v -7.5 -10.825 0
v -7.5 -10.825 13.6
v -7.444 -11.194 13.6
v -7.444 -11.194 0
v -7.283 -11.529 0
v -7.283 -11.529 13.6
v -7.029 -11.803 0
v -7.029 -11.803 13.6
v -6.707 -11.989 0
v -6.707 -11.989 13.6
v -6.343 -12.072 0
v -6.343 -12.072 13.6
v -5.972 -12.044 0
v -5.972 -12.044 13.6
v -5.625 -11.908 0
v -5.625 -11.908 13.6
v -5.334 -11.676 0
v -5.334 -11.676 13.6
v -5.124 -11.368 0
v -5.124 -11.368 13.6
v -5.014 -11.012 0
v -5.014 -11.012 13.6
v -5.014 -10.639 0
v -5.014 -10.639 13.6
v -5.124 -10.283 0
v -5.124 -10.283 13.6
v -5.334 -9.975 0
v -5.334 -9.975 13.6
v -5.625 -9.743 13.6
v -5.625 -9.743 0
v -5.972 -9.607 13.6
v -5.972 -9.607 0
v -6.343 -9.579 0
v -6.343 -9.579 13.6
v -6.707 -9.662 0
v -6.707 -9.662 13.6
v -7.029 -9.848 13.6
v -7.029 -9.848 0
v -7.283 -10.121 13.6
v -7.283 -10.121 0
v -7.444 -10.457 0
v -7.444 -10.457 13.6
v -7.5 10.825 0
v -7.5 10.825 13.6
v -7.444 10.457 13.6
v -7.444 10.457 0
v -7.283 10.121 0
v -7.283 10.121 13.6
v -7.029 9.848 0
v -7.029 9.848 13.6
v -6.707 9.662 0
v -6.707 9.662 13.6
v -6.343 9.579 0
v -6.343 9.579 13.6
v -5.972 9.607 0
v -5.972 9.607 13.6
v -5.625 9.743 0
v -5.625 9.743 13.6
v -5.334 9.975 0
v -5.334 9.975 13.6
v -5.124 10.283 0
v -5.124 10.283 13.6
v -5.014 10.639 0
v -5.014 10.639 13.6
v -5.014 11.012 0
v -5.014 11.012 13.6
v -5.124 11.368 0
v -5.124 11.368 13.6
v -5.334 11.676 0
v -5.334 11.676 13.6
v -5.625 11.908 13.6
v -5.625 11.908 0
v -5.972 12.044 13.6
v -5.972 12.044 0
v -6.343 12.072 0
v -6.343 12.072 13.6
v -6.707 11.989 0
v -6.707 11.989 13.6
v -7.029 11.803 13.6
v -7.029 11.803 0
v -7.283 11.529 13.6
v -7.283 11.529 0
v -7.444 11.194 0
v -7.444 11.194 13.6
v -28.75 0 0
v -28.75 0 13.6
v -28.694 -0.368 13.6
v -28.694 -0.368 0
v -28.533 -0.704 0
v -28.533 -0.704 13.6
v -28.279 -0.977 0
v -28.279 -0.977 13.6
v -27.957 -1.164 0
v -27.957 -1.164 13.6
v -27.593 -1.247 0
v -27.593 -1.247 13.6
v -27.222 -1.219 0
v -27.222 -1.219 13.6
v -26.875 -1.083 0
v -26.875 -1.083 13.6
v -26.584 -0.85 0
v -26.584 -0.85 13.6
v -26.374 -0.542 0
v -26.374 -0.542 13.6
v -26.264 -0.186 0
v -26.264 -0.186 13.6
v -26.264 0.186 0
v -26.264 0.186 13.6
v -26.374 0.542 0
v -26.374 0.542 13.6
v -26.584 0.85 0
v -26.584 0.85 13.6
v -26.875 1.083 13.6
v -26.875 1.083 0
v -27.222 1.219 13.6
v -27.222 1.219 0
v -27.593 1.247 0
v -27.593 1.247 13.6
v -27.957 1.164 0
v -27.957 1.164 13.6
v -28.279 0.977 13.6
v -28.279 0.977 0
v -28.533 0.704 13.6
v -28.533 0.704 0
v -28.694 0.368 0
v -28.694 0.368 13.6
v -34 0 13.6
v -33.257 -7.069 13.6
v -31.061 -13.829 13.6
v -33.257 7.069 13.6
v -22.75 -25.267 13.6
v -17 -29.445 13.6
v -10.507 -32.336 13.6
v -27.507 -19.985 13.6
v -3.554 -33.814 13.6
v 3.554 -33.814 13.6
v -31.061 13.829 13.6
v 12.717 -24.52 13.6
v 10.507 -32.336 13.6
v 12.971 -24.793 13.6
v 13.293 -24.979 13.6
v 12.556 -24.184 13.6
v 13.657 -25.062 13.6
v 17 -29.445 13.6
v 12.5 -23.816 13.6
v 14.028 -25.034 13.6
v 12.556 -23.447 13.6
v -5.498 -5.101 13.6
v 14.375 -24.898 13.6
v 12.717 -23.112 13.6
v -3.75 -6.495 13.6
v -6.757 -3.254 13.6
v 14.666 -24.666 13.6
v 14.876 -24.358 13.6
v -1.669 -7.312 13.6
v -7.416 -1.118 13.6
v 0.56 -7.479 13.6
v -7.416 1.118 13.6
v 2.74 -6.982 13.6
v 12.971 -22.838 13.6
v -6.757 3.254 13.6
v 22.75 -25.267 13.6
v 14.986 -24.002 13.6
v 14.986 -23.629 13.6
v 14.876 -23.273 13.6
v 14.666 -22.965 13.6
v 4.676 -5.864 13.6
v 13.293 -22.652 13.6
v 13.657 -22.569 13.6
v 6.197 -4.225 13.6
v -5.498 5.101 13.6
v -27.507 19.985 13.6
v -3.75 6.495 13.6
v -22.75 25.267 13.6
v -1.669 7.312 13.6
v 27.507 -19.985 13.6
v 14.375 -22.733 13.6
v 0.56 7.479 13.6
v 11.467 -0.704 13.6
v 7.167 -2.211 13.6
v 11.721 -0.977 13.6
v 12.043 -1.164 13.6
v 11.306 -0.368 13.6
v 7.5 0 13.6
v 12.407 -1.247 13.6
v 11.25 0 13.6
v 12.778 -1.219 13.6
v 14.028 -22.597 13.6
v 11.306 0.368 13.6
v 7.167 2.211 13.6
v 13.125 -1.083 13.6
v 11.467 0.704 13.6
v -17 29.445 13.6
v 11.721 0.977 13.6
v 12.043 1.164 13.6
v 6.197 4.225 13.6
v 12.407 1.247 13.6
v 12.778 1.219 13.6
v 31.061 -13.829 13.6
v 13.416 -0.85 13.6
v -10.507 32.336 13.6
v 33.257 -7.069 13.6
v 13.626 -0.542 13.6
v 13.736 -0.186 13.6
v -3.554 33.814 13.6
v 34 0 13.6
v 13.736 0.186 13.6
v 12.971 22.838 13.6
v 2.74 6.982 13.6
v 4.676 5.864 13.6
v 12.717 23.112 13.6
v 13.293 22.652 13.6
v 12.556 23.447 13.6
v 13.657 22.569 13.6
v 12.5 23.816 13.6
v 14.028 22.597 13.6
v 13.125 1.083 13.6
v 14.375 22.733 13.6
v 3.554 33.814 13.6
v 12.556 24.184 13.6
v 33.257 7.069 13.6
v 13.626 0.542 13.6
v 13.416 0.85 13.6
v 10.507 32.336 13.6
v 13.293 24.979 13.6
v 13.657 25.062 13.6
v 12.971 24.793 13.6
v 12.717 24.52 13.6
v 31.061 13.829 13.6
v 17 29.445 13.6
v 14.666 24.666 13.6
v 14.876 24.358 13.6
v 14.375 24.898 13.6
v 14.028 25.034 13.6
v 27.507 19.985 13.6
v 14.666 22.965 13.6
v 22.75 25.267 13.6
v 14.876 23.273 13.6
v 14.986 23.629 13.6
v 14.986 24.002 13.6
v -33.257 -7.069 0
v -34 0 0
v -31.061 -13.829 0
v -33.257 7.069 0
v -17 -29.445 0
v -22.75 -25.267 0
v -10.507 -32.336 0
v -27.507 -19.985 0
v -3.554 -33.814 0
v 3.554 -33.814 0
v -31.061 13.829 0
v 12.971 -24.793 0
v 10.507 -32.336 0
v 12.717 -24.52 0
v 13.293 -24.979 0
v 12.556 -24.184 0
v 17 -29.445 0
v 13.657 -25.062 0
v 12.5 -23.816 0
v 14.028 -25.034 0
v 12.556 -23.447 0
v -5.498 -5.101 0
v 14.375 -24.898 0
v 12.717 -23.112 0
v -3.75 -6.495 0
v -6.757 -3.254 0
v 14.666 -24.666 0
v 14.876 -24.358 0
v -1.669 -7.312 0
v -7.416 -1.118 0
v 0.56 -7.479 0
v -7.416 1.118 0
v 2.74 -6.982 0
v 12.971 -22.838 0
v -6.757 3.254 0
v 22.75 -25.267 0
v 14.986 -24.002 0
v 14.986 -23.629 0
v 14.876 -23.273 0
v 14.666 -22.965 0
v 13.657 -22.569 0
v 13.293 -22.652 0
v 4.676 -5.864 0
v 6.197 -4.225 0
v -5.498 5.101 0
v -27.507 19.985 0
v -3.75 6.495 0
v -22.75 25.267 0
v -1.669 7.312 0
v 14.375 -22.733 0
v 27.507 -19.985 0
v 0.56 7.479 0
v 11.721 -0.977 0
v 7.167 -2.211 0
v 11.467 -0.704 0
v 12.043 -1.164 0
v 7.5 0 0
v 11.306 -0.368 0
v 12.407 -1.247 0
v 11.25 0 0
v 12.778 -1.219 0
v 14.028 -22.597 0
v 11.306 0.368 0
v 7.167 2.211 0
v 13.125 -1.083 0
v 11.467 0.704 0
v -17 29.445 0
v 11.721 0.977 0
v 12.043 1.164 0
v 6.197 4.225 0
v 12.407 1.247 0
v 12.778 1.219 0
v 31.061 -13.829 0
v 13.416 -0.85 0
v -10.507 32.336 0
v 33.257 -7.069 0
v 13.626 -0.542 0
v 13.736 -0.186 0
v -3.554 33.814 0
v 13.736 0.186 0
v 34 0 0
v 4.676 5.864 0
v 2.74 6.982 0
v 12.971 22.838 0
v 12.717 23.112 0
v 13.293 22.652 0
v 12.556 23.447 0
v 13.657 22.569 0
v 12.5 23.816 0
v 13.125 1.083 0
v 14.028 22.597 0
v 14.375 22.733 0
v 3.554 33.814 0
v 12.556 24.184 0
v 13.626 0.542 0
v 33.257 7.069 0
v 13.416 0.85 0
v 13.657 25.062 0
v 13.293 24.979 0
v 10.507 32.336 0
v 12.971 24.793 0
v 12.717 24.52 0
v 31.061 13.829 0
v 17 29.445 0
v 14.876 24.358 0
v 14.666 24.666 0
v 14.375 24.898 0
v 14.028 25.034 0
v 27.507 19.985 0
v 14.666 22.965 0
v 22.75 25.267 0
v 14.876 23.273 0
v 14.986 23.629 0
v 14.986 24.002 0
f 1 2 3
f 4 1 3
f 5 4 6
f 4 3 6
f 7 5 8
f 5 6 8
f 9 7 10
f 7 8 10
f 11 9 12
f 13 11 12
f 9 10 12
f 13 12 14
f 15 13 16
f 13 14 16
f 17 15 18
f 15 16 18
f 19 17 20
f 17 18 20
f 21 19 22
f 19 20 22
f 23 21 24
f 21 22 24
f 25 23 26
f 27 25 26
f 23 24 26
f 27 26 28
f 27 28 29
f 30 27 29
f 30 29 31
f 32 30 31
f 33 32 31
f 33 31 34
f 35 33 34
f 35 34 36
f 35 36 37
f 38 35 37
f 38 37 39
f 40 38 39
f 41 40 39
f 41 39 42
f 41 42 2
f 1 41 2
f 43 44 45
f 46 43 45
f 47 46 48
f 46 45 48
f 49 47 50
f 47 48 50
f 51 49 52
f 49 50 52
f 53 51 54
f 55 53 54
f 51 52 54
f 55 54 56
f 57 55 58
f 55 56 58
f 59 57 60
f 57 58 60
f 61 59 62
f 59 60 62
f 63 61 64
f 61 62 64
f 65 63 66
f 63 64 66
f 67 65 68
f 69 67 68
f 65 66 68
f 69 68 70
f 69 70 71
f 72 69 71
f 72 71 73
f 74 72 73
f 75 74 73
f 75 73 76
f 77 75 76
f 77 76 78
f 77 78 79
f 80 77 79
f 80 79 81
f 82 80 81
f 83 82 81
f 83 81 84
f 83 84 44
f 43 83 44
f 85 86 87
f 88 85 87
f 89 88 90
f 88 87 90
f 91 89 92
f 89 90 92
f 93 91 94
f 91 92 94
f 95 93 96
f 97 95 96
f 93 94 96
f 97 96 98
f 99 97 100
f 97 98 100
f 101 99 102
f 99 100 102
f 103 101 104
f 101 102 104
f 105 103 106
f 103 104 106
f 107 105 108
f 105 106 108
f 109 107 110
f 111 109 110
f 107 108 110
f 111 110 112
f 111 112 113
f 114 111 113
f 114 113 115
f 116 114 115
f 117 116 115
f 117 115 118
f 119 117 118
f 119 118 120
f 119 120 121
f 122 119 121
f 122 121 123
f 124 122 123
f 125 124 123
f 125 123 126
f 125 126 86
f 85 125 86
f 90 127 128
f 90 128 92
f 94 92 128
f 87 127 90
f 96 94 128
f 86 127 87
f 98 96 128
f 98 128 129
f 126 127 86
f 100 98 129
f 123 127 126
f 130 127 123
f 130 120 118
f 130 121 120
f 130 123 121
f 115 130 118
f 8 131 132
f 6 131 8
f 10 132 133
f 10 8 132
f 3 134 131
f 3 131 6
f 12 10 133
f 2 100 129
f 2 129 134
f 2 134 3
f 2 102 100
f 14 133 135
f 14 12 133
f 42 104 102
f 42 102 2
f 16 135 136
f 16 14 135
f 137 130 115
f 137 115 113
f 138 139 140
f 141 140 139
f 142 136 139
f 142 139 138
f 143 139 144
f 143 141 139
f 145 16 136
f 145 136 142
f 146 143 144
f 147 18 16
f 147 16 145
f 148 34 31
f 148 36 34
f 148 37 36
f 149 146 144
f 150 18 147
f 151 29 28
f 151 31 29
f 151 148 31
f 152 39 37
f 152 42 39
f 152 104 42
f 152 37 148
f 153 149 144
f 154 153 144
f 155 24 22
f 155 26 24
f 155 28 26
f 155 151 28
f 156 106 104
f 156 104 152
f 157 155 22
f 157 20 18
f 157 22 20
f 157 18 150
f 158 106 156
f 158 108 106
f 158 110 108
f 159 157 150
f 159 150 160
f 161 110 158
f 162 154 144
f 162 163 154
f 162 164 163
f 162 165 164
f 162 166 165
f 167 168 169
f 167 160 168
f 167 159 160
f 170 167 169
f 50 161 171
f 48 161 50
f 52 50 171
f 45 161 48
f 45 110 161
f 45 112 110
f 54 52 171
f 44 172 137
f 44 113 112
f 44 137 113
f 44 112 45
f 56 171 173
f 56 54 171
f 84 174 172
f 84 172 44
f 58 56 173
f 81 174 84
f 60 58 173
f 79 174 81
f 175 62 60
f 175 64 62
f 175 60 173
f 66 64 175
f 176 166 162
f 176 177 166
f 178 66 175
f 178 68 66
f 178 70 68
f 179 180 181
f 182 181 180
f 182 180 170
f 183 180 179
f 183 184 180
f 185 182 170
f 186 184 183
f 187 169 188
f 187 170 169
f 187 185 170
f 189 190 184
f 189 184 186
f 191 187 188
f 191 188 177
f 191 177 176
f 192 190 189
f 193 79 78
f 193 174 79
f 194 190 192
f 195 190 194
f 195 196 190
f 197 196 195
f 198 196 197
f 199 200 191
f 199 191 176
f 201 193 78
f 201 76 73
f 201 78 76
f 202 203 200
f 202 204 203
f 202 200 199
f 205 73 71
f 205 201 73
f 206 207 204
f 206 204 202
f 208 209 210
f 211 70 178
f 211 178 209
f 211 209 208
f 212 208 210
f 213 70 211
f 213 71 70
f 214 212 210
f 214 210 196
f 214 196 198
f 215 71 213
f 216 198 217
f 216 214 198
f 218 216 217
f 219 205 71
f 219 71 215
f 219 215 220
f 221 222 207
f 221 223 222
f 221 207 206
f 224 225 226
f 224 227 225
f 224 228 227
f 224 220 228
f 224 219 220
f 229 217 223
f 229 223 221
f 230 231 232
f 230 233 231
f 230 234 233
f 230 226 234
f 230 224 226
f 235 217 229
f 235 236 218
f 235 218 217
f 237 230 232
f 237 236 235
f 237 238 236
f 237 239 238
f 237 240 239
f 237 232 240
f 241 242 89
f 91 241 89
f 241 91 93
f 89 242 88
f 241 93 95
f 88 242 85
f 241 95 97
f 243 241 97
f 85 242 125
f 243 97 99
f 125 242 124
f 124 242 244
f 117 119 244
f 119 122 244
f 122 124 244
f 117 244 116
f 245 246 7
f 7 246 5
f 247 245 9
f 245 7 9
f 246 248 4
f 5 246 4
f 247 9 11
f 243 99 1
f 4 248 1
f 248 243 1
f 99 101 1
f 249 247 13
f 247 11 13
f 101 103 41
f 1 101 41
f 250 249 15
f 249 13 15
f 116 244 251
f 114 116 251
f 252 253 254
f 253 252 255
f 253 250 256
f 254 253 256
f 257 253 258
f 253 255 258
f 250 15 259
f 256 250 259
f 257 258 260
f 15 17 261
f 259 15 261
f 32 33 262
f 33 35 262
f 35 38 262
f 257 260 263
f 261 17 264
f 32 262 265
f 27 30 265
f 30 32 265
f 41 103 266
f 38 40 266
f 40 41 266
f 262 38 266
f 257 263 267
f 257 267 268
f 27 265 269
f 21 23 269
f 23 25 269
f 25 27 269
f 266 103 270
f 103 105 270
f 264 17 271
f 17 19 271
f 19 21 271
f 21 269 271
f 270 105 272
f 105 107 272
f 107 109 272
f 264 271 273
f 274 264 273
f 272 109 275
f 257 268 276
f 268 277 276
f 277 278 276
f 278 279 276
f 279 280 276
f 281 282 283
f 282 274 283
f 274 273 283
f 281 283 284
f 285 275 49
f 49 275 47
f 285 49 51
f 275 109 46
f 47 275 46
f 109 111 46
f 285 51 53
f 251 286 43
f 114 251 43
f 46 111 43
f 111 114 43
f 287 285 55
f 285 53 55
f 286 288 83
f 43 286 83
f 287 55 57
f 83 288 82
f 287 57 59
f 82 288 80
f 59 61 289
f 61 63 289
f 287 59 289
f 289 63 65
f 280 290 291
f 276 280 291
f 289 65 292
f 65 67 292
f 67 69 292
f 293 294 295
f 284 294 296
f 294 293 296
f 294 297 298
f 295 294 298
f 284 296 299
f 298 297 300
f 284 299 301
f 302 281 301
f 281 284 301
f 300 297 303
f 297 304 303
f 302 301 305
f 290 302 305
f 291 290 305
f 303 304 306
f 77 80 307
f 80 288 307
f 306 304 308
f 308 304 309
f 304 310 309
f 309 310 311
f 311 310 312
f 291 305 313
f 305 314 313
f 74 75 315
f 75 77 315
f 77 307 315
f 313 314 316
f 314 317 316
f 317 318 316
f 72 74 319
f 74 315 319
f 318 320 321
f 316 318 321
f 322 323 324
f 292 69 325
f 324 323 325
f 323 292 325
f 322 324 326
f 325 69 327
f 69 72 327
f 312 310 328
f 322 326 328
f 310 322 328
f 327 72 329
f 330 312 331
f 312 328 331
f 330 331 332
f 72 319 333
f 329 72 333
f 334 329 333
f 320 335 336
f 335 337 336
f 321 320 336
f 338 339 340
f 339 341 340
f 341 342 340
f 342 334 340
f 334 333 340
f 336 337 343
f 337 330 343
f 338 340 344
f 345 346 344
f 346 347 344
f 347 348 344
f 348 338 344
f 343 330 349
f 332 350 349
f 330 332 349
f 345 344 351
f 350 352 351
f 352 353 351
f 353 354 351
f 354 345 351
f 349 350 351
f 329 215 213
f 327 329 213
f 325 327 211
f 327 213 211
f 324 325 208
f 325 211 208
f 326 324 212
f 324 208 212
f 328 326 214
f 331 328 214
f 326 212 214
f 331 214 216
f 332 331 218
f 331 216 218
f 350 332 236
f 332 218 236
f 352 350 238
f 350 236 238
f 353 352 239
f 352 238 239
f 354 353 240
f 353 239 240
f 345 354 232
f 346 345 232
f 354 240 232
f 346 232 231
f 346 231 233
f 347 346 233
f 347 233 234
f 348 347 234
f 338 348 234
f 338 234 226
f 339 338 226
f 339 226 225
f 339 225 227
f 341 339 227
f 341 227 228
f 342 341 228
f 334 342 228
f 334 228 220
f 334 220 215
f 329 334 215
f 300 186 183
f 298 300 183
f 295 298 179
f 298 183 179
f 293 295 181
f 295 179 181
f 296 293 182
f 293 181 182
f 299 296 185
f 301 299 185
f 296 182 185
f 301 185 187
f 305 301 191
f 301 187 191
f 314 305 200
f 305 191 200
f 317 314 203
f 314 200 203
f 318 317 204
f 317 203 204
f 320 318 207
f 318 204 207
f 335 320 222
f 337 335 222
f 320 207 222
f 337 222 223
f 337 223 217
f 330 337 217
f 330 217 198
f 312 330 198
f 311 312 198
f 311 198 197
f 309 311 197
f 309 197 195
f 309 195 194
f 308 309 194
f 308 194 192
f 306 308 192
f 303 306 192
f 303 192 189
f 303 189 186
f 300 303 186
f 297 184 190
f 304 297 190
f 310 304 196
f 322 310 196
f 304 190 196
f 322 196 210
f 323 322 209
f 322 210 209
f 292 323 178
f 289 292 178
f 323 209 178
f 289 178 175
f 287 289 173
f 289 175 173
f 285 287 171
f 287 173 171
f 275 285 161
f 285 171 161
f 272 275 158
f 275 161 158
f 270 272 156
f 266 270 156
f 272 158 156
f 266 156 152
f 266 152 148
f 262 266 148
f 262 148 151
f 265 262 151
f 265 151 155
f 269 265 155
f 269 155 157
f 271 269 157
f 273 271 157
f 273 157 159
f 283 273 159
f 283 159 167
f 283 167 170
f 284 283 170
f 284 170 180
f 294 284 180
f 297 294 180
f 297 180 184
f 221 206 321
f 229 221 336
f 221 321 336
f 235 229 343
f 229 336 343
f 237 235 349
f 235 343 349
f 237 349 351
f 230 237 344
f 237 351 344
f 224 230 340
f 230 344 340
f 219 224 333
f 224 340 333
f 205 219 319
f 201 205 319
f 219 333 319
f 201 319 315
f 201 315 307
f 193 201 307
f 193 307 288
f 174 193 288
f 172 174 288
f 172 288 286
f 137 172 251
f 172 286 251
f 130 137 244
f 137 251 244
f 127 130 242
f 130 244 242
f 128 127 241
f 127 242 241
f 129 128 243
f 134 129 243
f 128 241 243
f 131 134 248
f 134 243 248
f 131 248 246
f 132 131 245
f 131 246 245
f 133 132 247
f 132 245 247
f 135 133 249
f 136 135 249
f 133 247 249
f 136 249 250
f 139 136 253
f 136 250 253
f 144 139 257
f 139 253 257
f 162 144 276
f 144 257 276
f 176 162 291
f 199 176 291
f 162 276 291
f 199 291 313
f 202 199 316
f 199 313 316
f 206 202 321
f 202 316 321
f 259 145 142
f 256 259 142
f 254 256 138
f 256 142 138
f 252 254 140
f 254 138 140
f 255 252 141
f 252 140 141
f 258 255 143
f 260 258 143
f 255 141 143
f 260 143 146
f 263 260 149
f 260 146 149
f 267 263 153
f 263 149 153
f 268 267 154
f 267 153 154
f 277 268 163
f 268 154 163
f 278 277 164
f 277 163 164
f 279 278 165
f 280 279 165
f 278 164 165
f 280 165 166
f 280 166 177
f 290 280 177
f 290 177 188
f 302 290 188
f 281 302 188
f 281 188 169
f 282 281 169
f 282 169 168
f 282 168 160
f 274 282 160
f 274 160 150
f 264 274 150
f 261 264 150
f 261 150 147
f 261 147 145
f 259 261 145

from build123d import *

# Parameters (mm, degrees)
SKETCH_1_R          = 34
EXTRUDE_1_DEPTH     = 13.6
SKETCH_2_R          = 16.5
EXTRUDE_2_DEPTH     = 8.9
FILLET_1_R          = 1
SKETCH_3_R          = 4
CUT_EXTRUDE_1_DEPTH = 54.087192429
SKETCH_4_R          = 7.5
CUT_EXTRUDE_2_DEPTH = 54.087192429
M3X0_52_D           = 2.5
M3X0_53_D           = 2.5
SKETCH_15_R         = 20.204336051
CUT_EXTRUDE_3_DEPTH = 8.9


with BuildPart() as part:
    # Эскиз1 → Бобышка-Вытянуть1 (new body)
    with BuildSketch(Plane.XY):
        Circle(SKETCH_1_R)
    extrude(amount=EXTRUDE_1_DEPTH)

    # Эскиз2 → Бобышка-Вытянуть2 (add)
    with BuildSketch(Plane.XY.offset(13.6)):
        Circle(SKETCH_2_R)
    extrude(amount=EXTRUDE_2_DEPTH)

    # Скругление1
    fillet_1_edges = [part.edges().sort_by_distance(p)[0] for p in [
        (-16.5, 0, 22.5),
    ]]
    fillet(fillet_1_edges, radius=FILLET_1_R)

    # Эскиз3 → Вырез-Вытянуть1 (cut, through all)
    with BuildSketch(Plane(origin=(0, 0, 0), x_dir=(-1, 0, 0), z_dir=(0, 0, -1))):
        Circle(SKETCH_3_R)
    extrude(amount=-CUT_EXTRUDE_1_DEPTH, mode=Mode.SUBTRACT)

    # Эскиз4 → Вырез-Вытянуть2 (cut, through all)
    with BuildSketch(Plane.XY.offset(22.5)):
        Circle(SKETCH_4_R)
    extrude(amount=-CUT_EXTRUDE_2_DEPTH, mode=Mode.SUBTRACT)

    # Отверстие обработанное метчиком M3x0.52 (through all)
    with Locations(Plane(origin=(5.176865527, -11.054831177, 0), x_dir=(1, 0, 0), z_dir=(0, 0, -1))):
        with Locations((-11.426865527, -21.880148725), (-11.426865527, -0.22951363), (7.323134473, -11.054831177)):
            Hole(M3X0_52_D / 2)

    # Отверстие обработанное метчиком M3x0.53 (through all)
    with Locations(Plane(origin=(7.745995854, 28.191062488, 0), x_dir=(1, 0, 0), z_dir=(0, 0, -1))):
        with Locations((6.004004146, 4.375363884), (-35.245995854, 28.191062488), (6.004004146, 52.006761092)):
            Hole(M3X0_53_D / 2)

    # Эскиз15 → Вырез-Вытянуть3 (cut)
    with BuildSketch(Plane.XY.offset(22.5)):
        Circle(SKETCH_15_R)
    extrude(amount=-CUT_EXTRUDE_3_DEPTH, mode=Mode.SUBTRACT)


solid = part.part
